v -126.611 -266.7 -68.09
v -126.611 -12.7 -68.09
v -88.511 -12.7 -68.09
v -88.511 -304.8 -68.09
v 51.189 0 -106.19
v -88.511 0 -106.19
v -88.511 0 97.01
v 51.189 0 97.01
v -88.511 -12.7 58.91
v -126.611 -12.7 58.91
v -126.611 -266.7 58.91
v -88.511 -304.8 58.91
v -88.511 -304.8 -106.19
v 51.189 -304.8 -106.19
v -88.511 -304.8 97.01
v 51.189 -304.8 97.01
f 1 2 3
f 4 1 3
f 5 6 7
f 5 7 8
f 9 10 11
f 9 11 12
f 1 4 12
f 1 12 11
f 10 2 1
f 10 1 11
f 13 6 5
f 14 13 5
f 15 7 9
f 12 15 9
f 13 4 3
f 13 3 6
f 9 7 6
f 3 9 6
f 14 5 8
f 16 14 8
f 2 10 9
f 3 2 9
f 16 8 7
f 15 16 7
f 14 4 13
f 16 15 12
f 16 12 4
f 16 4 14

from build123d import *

# Parameters (mm, degrees)
F1_DEPTH = 304.8
F0_W     = 38.1
F0_H     = 127
F2_DEPTH = 304.8
F3_W     = 38.1
F3_H     = 12.7
F4_DEPTH = 165.101


with BuildPart() as f1:
    # F0 (on Front) → F1 (new body)
    with BuildSketch(Plane.XZ):
        Polygon((51.189408, 97.00968), (-88.510592, 97.00968), (-88.510592, 58.90968), (-88.510592, -68.09032), (-88.510592, -106.19032), (51.189408, -106.19032), align=None)
    extrude(amount=F1_DEPTH)

    # F0 (on Front) → F2 (join)
    with BuildSketch(Plane.XZ):
        with Locations((-107.560592, -4.59032)):
            Rectangle(F0_W, F0_H)
    extrude(amount=F2_DEPTH)

    # F3 (on face) → F4 (cut, through all)
    with BuildSketch(Plane.XY.offset(58.90968)):
        with Locations((-107.560592, -6.35)):
            Rectangle(F3_W, F3_H)
        Polygon((-88.510592, -304.8), (-126.610592, -266.7), (-126.610592, -304.8), align=None)
    extrude(amount=-F4_DEPTH, mode=Mode.SUBTRACT)


solid = f1.part
